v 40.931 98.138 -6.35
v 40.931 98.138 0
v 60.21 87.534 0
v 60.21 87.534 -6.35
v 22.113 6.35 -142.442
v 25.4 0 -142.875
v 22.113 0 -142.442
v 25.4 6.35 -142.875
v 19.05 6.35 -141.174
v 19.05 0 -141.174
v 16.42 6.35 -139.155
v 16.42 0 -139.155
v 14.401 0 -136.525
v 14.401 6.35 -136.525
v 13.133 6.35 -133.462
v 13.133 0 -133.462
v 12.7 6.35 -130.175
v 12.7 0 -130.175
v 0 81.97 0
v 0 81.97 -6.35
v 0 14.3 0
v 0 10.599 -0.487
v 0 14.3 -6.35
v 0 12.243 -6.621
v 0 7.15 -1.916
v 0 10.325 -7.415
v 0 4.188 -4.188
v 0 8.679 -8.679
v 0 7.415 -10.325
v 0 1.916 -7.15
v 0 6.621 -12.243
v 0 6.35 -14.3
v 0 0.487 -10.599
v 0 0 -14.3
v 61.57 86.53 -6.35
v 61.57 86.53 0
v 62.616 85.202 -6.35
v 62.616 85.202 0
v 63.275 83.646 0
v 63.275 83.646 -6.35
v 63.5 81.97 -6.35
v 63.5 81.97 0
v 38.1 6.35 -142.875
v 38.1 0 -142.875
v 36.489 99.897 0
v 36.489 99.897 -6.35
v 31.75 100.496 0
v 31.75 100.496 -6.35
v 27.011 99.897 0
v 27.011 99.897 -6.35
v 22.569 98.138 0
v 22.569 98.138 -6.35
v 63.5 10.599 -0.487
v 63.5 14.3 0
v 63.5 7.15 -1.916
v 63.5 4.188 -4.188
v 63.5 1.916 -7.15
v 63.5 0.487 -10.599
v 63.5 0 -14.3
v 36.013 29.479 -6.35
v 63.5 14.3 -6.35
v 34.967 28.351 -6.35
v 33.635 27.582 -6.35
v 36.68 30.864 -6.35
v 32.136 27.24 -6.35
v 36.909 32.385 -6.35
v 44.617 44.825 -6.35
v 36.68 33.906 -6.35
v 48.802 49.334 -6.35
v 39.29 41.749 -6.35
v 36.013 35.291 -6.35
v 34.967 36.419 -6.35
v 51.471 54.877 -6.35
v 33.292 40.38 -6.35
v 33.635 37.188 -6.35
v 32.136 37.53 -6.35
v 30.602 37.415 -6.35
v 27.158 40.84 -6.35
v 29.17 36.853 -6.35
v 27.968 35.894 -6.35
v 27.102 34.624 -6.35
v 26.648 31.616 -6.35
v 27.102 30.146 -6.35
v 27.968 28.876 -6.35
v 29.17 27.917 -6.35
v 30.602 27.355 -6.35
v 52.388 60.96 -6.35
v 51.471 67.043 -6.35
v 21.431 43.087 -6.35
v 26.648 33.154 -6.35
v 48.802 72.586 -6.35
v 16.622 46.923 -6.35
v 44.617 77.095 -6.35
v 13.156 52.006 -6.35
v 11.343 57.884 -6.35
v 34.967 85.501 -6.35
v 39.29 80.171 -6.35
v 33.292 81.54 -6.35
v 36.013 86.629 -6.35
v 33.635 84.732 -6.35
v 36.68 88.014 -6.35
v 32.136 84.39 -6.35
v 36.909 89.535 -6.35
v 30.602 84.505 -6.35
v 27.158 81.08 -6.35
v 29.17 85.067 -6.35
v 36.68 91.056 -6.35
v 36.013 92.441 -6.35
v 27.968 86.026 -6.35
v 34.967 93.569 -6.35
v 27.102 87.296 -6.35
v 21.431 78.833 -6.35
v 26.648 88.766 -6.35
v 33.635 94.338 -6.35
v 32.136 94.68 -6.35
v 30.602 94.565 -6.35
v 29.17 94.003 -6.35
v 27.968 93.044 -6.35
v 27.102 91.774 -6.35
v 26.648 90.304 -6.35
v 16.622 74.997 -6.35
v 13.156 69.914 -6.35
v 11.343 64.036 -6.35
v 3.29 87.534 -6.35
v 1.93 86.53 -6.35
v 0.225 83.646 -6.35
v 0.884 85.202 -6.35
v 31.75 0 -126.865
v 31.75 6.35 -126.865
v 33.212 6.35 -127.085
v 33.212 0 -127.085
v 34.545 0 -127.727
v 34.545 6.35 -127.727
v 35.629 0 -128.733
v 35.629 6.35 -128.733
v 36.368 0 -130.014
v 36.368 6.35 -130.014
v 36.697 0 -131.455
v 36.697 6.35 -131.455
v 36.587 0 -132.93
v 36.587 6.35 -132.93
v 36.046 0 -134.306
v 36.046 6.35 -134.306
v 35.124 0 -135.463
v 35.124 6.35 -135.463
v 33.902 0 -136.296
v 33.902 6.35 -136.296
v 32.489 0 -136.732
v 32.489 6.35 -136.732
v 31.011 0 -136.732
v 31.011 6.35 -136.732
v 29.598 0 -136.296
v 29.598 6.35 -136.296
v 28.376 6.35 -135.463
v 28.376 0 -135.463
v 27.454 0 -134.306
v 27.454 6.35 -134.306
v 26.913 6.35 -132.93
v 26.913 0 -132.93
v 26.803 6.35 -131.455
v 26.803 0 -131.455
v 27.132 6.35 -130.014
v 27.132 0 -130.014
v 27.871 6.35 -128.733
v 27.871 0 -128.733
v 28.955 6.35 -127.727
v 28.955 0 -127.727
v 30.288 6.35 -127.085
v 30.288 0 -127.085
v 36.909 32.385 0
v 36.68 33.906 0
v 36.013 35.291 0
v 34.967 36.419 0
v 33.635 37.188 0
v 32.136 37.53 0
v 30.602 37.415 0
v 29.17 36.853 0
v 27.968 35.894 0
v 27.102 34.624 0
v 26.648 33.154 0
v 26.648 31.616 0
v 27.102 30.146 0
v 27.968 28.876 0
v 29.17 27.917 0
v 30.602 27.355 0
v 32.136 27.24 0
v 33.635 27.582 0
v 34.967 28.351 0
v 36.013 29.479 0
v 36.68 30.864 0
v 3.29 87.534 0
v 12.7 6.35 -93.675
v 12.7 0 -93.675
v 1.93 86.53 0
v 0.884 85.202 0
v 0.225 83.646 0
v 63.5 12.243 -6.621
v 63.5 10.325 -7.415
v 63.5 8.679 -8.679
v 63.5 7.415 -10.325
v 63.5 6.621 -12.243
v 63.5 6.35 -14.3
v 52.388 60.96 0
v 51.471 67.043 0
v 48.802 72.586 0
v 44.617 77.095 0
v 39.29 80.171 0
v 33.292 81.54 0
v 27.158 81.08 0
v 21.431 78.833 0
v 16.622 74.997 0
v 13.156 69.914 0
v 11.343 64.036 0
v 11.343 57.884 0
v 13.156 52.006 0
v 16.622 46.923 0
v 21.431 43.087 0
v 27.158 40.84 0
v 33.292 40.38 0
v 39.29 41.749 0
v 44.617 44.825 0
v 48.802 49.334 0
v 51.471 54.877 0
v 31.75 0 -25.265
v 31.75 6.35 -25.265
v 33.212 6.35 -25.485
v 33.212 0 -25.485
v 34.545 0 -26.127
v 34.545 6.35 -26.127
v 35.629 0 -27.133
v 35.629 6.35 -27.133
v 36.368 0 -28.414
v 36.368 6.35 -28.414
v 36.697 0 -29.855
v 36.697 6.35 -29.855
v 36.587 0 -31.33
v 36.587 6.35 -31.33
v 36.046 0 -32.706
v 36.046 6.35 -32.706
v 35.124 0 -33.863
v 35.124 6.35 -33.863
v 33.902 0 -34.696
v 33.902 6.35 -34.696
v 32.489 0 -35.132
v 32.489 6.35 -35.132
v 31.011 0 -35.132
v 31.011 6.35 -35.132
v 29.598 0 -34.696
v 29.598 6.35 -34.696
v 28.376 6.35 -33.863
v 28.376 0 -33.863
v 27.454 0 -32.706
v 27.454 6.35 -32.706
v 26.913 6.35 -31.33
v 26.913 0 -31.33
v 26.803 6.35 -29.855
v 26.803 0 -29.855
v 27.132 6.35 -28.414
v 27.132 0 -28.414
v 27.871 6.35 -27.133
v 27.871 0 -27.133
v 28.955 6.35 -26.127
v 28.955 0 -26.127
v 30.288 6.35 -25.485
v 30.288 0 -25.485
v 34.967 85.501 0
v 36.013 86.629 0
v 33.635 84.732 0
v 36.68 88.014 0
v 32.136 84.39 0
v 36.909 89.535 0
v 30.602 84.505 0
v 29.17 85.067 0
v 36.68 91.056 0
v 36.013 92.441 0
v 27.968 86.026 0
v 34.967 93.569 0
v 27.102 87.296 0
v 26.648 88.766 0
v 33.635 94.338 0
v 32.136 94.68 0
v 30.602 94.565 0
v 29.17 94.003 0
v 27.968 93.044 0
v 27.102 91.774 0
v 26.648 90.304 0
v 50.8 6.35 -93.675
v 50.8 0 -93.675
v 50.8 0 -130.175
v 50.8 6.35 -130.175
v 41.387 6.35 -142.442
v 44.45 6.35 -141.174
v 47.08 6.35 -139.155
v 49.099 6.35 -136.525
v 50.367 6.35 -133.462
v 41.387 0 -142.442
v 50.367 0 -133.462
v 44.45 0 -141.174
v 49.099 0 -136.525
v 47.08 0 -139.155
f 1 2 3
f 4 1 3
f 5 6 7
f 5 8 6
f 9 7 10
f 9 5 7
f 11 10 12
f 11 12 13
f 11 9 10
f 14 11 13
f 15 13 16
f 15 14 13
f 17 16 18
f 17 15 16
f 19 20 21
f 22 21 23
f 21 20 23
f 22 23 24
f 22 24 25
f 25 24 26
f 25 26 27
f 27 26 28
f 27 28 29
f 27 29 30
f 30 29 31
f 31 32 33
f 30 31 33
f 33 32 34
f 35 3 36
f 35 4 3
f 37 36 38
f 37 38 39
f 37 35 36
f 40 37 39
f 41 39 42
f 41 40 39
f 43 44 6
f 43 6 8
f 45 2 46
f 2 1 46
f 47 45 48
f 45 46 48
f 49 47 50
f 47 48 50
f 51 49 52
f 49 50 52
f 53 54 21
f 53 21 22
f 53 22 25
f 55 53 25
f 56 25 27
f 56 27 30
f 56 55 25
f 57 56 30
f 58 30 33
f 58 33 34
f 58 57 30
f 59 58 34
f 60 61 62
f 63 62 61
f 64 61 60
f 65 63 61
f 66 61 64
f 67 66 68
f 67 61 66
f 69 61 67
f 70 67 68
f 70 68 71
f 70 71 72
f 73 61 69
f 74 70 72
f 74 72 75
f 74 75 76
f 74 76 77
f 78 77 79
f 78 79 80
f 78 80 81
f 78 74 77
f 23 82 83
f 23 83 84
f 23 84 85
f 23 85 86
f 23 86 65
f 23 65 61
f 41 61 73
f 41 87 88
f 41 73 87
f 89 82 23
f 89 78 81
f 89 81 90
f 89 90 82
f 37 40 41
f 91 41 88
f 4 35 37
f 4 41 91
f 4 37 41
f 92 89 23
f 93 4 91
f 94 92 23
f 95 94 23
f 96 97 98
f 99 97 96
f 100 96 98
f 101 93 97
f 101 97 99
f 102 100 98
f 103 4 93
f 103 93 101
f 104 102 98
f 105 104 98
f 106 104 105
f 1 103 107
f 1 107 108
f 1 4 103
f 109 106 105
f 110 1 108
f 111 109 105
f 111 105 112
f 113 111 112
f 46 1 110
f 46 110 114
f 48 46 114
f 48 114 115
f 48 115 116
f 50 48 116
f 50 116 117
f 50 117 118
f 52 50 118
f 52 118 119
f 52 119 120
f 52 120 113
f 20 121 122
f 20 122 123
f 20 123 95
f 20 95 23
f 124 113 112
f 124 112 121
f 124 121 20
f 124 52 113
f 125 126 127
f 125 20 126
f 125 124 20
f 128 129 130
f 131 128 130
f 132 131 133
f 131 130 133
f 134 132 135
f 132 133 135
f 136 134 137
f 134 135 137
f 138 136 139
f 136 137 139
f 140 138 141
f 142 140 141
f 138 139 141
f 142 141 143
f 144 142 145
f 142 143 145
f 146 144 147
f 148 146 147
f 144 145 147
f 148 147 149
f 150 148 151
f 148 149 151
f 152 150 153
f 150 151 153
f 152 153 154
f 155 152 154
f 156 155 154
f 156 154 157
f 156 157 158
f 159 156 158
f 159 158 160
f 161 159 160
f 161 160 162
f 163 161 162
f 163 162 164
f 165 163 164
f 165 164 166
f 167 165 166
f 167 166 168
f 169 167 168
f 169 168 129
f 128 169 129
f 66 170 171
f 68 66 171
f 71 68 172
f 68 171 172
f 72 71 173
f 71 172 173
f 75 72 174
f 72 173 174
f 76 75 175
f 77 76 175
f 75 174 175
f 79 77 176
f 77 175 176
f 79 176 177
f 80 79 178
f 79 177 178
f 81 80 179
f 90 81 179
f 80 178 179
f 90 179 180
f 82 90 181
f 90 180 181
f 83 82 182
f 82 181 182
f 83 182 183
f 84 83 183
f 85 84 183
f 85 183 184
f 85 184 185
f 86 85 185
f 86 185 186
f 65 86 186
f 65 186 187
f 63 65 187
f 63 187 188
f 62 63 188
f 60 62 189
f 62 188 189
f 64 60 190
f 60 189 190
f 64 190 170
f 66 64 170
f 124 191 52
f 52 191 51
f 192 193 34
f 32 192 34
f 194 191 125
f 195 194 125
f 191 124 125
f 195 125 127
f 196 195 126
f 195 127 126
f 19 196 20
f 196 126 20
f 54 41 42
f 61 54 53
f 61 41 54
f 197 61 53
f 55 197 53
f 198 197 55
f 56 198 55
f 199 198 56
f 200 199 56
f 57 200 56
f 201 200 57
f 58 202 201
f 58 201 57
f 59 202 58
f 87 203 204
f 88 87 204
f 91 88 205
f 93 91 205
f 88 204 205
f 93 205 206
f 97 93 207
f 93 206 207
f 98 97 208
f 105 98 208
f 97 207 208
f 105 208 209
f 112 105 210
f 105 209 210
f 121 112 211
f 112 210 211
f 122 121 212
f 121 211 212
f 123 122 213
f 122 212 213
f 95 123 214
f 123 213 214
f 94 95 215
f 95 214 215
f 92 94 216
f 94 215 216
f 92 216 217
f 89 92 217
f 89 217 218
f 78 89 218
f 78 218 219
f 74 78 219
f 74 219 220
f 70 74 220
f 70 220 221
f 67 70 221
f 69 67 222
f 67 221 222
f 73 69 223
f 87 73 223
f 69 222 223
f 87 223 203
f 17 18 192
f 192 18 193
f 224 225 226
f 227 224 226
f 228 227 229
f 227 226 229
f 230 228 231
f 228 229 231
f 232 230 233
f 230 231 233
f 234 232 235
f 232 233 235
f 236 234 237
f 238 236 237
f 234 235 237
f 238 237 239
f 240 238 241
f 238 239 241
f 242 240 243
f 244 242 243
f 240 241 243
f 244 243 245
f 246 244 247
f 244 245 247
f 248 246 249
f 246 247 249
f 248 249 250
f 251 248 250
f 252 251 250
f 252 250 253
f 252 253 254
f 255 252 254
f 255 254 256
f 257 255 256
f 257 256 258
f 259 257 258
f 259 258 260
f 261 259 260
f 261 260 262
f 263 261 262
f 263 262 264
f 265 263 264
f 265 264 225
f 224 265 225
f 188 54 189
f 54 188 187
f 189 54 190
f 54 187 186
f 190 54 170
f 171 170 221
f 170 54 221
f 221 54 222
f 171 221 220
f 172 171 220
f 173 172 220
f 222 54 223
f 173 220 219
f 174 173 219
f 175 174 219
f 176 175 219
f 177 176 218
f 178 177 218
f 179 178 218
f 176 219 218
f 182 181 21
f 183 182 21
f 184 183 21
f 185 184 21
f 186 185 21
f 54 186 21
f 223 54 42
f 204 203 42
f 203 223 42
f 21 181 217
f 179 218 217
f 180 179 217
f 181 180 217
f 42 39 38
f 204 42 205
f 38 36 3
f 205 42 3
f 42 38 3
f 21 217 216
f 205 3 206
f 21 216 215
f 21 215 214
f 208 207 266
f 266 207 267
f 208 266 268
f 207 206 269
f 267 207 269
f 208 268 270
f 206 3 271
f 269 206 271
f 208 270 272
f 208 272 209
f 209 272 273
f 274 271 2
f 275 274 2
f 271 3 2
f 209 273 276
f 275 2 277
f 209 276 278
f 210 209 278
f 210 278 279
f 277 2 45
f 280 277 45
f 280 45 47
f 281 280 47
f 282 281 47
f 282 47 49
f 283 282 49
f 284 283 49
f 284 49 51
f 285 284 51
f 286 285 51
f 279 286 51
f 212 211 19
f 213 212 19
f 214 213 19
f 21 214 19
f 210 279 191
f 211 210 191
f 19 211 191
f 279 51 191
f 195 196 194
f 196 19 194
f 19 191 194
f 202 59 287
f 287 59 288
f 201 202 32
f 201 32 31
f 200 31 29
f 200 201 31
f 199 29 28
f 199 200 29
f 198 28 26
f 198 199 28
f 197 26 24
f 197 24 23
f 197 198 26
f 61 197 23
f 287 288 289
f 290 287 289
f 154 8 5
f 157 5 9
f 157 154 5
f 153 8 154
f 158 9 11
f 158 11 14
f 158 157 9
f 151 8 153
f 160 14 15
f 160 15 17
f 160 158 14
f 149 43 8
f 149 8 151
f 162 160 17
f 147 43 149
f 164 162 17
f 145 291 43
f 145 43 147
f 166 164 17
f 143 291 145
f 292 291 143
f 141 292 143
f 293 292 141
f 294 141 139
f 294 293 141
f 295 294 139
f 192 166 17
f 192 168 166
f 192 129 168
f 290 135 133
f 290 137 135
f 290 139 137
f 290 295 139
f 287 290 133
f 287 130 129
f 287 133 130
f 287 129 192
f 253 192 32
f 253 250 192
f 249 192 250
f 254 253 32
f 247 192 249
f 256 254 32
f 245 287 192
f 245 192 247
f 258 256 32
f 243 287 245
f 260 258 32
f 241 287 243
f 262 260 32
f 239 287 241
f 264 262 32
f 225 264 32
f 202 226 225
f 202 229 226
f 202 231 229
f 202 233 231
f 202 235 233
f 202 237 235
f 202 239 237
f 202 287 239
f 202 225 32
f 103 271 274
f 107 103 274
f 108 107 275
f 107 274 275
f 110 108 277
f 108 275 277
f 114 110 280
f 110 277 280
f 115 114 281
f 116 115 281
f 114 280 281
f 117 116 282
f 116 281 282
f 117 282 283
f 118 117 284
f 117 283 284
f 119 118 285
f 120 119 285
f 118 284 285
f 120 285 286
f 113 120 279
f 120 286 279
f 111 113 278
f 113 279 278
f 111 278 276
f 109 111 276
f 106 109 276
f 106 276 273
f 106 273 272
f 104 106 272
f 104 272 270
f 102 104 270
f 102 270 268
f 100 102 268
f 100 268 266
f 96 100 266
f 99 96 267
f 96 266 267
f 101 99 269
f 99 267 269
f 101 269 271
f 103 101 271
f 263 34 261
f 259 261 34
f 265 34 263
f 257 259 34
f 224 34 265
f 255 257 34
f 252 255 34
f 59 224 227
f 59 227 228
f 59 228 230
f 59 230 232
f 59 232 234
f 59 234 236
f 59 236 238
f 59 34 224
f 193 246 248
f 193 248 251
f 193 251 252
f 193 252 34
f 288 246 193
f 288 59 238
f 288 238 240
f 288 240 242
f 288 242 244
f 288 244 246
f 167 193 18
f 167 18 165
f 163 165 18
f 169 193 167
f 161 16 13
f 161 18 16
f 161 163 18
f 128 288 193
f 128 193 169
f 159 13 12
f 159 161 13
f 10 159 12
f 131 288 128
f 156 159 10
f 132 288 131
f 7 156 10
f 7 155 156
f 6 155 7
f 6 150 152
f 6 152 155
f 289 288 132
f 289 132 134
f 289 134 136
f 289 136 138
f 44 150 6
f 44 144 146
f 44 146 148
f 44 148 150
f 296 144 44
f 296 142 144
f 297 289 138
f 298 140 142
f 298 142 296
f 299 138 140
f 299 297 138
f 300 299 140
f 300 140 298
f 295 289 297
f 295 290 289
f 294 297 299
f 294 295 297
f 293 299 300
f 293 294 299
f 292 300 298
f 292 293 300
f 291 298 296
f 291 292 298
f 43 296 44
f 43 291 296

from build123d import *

# Parameters (mm, degrees)
SKETCH1_R                    = 20.6375
SKETCH1_R_2                  = 5.159375
BASE_FLANGE1_DEPTH           = 6.35
EDGE_FLANGE1_STRIP_W         = 41.3004
EDGE_FLANGE1_STRIP_H         = 6.35
EDGE_FLANGE1_STRIP_CUT_DEPTH = 63.5
EDGE_FLANGE1_DEPTH           = 63.5
SKETCH9_R                    = 4.9609375
CUT_EXTRUDE1_DEPTH           = 184.910350528
CUT_EXTRUDE2_DEPTH           = 188.331726574
FILLET1_R                    = 19.05
FILLET2_R                    = 6.35
FILLET3_R                    = 12.7


# Sheet-metal steps are written as plain solids
with BuildPart() as part:
    # Sketch1 → Base-Flange1 (new body)
    with BuildSketch(Plane.XY):
        Polygon((0, 85.725), (31.75, 103.1875), (63.5, 85.725), (63.5, 0), (0, 0), align=None)
        with Locations((31.75, 60.96)):
            Circle(SKETCH1_R, mode=Mode.SUBTRACT)
        with Locations((31.75, 89.535)):
            Circle(SKETCH1_R_2, mode=Mode.SUBTRACT)
        with Locations((31.75, 32.385)):
            Circle(SKETCH1_R_2, mode=Mode.SUBTRACT)
    extrude(amount=-BASE_FLANGE1_DEPTH)

    # Edge-Flange1 strip (across the edge) → Edge-Flange1 strip cut (cut)
    with BuildSketch(Plane(origin=(63.5, 0, -6.35), x_dir=(0, 1, 0), z_dir=(-1, 0, 0))):
        with Locations((-6.35, -3.175)):
            Rectangle(EDGE_FLANGE1_STRIP_W, EDGE_FLANGE1_STRIP_H)
    extrude(amount=EDGE_FLANGE1_STRIP_CUT_DEPTH, mode=Mode.SUBTRACT)

    # Edge-Flange1 section (across the edge) → Edge-Flange1 (add)
    with BuildSketch(Plane(origin=(63.5, 0, -6.35), x_dir=(0, 1, 0), z_dir=(-1, 0, 0))):
        with BuildLine():
            Line((0, 7.9502), (0, 136.525))
            Line((0, 136.525), (6.35, 136.525))
            Line((6.35, 136.525), (6.35, 7.9502))
            ThreePointArc((6.35, 7.9502), (8.678559668, 2.328559668), (14.3002, 0))
            Line((14.3002, 0), (14.3002, -6.35))
            ThreePointArc((14.3002, -6.35), (4.188431608, -2.161568392), (0, 7.9502))
        make_face()
    extrude(amount=EDGE_FLANGE1_DEPTH)

    # Sketch9 → Cut-Extrude1 (cut, through all)
    with BuildSketch(Plane(origin=(0, 6.35, 0), x_dir=(1, 0, 0), z_dir=(0, 1, 0))):
        with Locations(Location((31.75, 30.226, 0), (0, 0, 270))):
            Circle(SKETCH9_R)
        with Locations(Location((31.75, 131.826, 0), (0, 0, 270))):
            Circle(SKETCH9_R)
    extrude(amount=-CUT_EXTRUDE1_DEPTH, mode=Mode.SUBTRACT)

    # Sketch10 → Cut-Extrude2 (cut, through all)
    with BuildSketch(Plane.XZ):
        Polygon((0, -142.875), (12.7, -142.875), (12.7, -93.6752), (0, -14.3002), align=None)
        Polygon((63.5, -142.875), (63.5, -14.3002), (50.8, -93.6752), (50.8, -142.875), align=None)
    extrude(amount=-CUT_EXTRUDE2_DEPTH, mode=Mode.SUBTRACT)

    # Fillet1
    fillet1_edges = [part.edges().sort_by_distance(p)[0] for p in [
        (31.75, 103.1875, -3.175),
    ]]
    fillet(fillet1_edges, radius=FILLET1_R)

    # Fillet2
    fillet2_edges = [part.edges().sort_by_distance(p)[0] for p in [
        (0, 85.725, -3.175),
        (63.5, 85.725, -3.175),
    ]]
    fillet(fillet2_edges, radius=FILLET2_R)

    # Fillet3
    fillet3_edges = [part.edges().sort_by_distance(p)[0] for p in [
        (50.8, 3.175, -142.875),
        (12.7, 3.175, -142.875),
    ]]
    fillet(fillet3_edges, radius=FILLET3_R)


solid = part.part
